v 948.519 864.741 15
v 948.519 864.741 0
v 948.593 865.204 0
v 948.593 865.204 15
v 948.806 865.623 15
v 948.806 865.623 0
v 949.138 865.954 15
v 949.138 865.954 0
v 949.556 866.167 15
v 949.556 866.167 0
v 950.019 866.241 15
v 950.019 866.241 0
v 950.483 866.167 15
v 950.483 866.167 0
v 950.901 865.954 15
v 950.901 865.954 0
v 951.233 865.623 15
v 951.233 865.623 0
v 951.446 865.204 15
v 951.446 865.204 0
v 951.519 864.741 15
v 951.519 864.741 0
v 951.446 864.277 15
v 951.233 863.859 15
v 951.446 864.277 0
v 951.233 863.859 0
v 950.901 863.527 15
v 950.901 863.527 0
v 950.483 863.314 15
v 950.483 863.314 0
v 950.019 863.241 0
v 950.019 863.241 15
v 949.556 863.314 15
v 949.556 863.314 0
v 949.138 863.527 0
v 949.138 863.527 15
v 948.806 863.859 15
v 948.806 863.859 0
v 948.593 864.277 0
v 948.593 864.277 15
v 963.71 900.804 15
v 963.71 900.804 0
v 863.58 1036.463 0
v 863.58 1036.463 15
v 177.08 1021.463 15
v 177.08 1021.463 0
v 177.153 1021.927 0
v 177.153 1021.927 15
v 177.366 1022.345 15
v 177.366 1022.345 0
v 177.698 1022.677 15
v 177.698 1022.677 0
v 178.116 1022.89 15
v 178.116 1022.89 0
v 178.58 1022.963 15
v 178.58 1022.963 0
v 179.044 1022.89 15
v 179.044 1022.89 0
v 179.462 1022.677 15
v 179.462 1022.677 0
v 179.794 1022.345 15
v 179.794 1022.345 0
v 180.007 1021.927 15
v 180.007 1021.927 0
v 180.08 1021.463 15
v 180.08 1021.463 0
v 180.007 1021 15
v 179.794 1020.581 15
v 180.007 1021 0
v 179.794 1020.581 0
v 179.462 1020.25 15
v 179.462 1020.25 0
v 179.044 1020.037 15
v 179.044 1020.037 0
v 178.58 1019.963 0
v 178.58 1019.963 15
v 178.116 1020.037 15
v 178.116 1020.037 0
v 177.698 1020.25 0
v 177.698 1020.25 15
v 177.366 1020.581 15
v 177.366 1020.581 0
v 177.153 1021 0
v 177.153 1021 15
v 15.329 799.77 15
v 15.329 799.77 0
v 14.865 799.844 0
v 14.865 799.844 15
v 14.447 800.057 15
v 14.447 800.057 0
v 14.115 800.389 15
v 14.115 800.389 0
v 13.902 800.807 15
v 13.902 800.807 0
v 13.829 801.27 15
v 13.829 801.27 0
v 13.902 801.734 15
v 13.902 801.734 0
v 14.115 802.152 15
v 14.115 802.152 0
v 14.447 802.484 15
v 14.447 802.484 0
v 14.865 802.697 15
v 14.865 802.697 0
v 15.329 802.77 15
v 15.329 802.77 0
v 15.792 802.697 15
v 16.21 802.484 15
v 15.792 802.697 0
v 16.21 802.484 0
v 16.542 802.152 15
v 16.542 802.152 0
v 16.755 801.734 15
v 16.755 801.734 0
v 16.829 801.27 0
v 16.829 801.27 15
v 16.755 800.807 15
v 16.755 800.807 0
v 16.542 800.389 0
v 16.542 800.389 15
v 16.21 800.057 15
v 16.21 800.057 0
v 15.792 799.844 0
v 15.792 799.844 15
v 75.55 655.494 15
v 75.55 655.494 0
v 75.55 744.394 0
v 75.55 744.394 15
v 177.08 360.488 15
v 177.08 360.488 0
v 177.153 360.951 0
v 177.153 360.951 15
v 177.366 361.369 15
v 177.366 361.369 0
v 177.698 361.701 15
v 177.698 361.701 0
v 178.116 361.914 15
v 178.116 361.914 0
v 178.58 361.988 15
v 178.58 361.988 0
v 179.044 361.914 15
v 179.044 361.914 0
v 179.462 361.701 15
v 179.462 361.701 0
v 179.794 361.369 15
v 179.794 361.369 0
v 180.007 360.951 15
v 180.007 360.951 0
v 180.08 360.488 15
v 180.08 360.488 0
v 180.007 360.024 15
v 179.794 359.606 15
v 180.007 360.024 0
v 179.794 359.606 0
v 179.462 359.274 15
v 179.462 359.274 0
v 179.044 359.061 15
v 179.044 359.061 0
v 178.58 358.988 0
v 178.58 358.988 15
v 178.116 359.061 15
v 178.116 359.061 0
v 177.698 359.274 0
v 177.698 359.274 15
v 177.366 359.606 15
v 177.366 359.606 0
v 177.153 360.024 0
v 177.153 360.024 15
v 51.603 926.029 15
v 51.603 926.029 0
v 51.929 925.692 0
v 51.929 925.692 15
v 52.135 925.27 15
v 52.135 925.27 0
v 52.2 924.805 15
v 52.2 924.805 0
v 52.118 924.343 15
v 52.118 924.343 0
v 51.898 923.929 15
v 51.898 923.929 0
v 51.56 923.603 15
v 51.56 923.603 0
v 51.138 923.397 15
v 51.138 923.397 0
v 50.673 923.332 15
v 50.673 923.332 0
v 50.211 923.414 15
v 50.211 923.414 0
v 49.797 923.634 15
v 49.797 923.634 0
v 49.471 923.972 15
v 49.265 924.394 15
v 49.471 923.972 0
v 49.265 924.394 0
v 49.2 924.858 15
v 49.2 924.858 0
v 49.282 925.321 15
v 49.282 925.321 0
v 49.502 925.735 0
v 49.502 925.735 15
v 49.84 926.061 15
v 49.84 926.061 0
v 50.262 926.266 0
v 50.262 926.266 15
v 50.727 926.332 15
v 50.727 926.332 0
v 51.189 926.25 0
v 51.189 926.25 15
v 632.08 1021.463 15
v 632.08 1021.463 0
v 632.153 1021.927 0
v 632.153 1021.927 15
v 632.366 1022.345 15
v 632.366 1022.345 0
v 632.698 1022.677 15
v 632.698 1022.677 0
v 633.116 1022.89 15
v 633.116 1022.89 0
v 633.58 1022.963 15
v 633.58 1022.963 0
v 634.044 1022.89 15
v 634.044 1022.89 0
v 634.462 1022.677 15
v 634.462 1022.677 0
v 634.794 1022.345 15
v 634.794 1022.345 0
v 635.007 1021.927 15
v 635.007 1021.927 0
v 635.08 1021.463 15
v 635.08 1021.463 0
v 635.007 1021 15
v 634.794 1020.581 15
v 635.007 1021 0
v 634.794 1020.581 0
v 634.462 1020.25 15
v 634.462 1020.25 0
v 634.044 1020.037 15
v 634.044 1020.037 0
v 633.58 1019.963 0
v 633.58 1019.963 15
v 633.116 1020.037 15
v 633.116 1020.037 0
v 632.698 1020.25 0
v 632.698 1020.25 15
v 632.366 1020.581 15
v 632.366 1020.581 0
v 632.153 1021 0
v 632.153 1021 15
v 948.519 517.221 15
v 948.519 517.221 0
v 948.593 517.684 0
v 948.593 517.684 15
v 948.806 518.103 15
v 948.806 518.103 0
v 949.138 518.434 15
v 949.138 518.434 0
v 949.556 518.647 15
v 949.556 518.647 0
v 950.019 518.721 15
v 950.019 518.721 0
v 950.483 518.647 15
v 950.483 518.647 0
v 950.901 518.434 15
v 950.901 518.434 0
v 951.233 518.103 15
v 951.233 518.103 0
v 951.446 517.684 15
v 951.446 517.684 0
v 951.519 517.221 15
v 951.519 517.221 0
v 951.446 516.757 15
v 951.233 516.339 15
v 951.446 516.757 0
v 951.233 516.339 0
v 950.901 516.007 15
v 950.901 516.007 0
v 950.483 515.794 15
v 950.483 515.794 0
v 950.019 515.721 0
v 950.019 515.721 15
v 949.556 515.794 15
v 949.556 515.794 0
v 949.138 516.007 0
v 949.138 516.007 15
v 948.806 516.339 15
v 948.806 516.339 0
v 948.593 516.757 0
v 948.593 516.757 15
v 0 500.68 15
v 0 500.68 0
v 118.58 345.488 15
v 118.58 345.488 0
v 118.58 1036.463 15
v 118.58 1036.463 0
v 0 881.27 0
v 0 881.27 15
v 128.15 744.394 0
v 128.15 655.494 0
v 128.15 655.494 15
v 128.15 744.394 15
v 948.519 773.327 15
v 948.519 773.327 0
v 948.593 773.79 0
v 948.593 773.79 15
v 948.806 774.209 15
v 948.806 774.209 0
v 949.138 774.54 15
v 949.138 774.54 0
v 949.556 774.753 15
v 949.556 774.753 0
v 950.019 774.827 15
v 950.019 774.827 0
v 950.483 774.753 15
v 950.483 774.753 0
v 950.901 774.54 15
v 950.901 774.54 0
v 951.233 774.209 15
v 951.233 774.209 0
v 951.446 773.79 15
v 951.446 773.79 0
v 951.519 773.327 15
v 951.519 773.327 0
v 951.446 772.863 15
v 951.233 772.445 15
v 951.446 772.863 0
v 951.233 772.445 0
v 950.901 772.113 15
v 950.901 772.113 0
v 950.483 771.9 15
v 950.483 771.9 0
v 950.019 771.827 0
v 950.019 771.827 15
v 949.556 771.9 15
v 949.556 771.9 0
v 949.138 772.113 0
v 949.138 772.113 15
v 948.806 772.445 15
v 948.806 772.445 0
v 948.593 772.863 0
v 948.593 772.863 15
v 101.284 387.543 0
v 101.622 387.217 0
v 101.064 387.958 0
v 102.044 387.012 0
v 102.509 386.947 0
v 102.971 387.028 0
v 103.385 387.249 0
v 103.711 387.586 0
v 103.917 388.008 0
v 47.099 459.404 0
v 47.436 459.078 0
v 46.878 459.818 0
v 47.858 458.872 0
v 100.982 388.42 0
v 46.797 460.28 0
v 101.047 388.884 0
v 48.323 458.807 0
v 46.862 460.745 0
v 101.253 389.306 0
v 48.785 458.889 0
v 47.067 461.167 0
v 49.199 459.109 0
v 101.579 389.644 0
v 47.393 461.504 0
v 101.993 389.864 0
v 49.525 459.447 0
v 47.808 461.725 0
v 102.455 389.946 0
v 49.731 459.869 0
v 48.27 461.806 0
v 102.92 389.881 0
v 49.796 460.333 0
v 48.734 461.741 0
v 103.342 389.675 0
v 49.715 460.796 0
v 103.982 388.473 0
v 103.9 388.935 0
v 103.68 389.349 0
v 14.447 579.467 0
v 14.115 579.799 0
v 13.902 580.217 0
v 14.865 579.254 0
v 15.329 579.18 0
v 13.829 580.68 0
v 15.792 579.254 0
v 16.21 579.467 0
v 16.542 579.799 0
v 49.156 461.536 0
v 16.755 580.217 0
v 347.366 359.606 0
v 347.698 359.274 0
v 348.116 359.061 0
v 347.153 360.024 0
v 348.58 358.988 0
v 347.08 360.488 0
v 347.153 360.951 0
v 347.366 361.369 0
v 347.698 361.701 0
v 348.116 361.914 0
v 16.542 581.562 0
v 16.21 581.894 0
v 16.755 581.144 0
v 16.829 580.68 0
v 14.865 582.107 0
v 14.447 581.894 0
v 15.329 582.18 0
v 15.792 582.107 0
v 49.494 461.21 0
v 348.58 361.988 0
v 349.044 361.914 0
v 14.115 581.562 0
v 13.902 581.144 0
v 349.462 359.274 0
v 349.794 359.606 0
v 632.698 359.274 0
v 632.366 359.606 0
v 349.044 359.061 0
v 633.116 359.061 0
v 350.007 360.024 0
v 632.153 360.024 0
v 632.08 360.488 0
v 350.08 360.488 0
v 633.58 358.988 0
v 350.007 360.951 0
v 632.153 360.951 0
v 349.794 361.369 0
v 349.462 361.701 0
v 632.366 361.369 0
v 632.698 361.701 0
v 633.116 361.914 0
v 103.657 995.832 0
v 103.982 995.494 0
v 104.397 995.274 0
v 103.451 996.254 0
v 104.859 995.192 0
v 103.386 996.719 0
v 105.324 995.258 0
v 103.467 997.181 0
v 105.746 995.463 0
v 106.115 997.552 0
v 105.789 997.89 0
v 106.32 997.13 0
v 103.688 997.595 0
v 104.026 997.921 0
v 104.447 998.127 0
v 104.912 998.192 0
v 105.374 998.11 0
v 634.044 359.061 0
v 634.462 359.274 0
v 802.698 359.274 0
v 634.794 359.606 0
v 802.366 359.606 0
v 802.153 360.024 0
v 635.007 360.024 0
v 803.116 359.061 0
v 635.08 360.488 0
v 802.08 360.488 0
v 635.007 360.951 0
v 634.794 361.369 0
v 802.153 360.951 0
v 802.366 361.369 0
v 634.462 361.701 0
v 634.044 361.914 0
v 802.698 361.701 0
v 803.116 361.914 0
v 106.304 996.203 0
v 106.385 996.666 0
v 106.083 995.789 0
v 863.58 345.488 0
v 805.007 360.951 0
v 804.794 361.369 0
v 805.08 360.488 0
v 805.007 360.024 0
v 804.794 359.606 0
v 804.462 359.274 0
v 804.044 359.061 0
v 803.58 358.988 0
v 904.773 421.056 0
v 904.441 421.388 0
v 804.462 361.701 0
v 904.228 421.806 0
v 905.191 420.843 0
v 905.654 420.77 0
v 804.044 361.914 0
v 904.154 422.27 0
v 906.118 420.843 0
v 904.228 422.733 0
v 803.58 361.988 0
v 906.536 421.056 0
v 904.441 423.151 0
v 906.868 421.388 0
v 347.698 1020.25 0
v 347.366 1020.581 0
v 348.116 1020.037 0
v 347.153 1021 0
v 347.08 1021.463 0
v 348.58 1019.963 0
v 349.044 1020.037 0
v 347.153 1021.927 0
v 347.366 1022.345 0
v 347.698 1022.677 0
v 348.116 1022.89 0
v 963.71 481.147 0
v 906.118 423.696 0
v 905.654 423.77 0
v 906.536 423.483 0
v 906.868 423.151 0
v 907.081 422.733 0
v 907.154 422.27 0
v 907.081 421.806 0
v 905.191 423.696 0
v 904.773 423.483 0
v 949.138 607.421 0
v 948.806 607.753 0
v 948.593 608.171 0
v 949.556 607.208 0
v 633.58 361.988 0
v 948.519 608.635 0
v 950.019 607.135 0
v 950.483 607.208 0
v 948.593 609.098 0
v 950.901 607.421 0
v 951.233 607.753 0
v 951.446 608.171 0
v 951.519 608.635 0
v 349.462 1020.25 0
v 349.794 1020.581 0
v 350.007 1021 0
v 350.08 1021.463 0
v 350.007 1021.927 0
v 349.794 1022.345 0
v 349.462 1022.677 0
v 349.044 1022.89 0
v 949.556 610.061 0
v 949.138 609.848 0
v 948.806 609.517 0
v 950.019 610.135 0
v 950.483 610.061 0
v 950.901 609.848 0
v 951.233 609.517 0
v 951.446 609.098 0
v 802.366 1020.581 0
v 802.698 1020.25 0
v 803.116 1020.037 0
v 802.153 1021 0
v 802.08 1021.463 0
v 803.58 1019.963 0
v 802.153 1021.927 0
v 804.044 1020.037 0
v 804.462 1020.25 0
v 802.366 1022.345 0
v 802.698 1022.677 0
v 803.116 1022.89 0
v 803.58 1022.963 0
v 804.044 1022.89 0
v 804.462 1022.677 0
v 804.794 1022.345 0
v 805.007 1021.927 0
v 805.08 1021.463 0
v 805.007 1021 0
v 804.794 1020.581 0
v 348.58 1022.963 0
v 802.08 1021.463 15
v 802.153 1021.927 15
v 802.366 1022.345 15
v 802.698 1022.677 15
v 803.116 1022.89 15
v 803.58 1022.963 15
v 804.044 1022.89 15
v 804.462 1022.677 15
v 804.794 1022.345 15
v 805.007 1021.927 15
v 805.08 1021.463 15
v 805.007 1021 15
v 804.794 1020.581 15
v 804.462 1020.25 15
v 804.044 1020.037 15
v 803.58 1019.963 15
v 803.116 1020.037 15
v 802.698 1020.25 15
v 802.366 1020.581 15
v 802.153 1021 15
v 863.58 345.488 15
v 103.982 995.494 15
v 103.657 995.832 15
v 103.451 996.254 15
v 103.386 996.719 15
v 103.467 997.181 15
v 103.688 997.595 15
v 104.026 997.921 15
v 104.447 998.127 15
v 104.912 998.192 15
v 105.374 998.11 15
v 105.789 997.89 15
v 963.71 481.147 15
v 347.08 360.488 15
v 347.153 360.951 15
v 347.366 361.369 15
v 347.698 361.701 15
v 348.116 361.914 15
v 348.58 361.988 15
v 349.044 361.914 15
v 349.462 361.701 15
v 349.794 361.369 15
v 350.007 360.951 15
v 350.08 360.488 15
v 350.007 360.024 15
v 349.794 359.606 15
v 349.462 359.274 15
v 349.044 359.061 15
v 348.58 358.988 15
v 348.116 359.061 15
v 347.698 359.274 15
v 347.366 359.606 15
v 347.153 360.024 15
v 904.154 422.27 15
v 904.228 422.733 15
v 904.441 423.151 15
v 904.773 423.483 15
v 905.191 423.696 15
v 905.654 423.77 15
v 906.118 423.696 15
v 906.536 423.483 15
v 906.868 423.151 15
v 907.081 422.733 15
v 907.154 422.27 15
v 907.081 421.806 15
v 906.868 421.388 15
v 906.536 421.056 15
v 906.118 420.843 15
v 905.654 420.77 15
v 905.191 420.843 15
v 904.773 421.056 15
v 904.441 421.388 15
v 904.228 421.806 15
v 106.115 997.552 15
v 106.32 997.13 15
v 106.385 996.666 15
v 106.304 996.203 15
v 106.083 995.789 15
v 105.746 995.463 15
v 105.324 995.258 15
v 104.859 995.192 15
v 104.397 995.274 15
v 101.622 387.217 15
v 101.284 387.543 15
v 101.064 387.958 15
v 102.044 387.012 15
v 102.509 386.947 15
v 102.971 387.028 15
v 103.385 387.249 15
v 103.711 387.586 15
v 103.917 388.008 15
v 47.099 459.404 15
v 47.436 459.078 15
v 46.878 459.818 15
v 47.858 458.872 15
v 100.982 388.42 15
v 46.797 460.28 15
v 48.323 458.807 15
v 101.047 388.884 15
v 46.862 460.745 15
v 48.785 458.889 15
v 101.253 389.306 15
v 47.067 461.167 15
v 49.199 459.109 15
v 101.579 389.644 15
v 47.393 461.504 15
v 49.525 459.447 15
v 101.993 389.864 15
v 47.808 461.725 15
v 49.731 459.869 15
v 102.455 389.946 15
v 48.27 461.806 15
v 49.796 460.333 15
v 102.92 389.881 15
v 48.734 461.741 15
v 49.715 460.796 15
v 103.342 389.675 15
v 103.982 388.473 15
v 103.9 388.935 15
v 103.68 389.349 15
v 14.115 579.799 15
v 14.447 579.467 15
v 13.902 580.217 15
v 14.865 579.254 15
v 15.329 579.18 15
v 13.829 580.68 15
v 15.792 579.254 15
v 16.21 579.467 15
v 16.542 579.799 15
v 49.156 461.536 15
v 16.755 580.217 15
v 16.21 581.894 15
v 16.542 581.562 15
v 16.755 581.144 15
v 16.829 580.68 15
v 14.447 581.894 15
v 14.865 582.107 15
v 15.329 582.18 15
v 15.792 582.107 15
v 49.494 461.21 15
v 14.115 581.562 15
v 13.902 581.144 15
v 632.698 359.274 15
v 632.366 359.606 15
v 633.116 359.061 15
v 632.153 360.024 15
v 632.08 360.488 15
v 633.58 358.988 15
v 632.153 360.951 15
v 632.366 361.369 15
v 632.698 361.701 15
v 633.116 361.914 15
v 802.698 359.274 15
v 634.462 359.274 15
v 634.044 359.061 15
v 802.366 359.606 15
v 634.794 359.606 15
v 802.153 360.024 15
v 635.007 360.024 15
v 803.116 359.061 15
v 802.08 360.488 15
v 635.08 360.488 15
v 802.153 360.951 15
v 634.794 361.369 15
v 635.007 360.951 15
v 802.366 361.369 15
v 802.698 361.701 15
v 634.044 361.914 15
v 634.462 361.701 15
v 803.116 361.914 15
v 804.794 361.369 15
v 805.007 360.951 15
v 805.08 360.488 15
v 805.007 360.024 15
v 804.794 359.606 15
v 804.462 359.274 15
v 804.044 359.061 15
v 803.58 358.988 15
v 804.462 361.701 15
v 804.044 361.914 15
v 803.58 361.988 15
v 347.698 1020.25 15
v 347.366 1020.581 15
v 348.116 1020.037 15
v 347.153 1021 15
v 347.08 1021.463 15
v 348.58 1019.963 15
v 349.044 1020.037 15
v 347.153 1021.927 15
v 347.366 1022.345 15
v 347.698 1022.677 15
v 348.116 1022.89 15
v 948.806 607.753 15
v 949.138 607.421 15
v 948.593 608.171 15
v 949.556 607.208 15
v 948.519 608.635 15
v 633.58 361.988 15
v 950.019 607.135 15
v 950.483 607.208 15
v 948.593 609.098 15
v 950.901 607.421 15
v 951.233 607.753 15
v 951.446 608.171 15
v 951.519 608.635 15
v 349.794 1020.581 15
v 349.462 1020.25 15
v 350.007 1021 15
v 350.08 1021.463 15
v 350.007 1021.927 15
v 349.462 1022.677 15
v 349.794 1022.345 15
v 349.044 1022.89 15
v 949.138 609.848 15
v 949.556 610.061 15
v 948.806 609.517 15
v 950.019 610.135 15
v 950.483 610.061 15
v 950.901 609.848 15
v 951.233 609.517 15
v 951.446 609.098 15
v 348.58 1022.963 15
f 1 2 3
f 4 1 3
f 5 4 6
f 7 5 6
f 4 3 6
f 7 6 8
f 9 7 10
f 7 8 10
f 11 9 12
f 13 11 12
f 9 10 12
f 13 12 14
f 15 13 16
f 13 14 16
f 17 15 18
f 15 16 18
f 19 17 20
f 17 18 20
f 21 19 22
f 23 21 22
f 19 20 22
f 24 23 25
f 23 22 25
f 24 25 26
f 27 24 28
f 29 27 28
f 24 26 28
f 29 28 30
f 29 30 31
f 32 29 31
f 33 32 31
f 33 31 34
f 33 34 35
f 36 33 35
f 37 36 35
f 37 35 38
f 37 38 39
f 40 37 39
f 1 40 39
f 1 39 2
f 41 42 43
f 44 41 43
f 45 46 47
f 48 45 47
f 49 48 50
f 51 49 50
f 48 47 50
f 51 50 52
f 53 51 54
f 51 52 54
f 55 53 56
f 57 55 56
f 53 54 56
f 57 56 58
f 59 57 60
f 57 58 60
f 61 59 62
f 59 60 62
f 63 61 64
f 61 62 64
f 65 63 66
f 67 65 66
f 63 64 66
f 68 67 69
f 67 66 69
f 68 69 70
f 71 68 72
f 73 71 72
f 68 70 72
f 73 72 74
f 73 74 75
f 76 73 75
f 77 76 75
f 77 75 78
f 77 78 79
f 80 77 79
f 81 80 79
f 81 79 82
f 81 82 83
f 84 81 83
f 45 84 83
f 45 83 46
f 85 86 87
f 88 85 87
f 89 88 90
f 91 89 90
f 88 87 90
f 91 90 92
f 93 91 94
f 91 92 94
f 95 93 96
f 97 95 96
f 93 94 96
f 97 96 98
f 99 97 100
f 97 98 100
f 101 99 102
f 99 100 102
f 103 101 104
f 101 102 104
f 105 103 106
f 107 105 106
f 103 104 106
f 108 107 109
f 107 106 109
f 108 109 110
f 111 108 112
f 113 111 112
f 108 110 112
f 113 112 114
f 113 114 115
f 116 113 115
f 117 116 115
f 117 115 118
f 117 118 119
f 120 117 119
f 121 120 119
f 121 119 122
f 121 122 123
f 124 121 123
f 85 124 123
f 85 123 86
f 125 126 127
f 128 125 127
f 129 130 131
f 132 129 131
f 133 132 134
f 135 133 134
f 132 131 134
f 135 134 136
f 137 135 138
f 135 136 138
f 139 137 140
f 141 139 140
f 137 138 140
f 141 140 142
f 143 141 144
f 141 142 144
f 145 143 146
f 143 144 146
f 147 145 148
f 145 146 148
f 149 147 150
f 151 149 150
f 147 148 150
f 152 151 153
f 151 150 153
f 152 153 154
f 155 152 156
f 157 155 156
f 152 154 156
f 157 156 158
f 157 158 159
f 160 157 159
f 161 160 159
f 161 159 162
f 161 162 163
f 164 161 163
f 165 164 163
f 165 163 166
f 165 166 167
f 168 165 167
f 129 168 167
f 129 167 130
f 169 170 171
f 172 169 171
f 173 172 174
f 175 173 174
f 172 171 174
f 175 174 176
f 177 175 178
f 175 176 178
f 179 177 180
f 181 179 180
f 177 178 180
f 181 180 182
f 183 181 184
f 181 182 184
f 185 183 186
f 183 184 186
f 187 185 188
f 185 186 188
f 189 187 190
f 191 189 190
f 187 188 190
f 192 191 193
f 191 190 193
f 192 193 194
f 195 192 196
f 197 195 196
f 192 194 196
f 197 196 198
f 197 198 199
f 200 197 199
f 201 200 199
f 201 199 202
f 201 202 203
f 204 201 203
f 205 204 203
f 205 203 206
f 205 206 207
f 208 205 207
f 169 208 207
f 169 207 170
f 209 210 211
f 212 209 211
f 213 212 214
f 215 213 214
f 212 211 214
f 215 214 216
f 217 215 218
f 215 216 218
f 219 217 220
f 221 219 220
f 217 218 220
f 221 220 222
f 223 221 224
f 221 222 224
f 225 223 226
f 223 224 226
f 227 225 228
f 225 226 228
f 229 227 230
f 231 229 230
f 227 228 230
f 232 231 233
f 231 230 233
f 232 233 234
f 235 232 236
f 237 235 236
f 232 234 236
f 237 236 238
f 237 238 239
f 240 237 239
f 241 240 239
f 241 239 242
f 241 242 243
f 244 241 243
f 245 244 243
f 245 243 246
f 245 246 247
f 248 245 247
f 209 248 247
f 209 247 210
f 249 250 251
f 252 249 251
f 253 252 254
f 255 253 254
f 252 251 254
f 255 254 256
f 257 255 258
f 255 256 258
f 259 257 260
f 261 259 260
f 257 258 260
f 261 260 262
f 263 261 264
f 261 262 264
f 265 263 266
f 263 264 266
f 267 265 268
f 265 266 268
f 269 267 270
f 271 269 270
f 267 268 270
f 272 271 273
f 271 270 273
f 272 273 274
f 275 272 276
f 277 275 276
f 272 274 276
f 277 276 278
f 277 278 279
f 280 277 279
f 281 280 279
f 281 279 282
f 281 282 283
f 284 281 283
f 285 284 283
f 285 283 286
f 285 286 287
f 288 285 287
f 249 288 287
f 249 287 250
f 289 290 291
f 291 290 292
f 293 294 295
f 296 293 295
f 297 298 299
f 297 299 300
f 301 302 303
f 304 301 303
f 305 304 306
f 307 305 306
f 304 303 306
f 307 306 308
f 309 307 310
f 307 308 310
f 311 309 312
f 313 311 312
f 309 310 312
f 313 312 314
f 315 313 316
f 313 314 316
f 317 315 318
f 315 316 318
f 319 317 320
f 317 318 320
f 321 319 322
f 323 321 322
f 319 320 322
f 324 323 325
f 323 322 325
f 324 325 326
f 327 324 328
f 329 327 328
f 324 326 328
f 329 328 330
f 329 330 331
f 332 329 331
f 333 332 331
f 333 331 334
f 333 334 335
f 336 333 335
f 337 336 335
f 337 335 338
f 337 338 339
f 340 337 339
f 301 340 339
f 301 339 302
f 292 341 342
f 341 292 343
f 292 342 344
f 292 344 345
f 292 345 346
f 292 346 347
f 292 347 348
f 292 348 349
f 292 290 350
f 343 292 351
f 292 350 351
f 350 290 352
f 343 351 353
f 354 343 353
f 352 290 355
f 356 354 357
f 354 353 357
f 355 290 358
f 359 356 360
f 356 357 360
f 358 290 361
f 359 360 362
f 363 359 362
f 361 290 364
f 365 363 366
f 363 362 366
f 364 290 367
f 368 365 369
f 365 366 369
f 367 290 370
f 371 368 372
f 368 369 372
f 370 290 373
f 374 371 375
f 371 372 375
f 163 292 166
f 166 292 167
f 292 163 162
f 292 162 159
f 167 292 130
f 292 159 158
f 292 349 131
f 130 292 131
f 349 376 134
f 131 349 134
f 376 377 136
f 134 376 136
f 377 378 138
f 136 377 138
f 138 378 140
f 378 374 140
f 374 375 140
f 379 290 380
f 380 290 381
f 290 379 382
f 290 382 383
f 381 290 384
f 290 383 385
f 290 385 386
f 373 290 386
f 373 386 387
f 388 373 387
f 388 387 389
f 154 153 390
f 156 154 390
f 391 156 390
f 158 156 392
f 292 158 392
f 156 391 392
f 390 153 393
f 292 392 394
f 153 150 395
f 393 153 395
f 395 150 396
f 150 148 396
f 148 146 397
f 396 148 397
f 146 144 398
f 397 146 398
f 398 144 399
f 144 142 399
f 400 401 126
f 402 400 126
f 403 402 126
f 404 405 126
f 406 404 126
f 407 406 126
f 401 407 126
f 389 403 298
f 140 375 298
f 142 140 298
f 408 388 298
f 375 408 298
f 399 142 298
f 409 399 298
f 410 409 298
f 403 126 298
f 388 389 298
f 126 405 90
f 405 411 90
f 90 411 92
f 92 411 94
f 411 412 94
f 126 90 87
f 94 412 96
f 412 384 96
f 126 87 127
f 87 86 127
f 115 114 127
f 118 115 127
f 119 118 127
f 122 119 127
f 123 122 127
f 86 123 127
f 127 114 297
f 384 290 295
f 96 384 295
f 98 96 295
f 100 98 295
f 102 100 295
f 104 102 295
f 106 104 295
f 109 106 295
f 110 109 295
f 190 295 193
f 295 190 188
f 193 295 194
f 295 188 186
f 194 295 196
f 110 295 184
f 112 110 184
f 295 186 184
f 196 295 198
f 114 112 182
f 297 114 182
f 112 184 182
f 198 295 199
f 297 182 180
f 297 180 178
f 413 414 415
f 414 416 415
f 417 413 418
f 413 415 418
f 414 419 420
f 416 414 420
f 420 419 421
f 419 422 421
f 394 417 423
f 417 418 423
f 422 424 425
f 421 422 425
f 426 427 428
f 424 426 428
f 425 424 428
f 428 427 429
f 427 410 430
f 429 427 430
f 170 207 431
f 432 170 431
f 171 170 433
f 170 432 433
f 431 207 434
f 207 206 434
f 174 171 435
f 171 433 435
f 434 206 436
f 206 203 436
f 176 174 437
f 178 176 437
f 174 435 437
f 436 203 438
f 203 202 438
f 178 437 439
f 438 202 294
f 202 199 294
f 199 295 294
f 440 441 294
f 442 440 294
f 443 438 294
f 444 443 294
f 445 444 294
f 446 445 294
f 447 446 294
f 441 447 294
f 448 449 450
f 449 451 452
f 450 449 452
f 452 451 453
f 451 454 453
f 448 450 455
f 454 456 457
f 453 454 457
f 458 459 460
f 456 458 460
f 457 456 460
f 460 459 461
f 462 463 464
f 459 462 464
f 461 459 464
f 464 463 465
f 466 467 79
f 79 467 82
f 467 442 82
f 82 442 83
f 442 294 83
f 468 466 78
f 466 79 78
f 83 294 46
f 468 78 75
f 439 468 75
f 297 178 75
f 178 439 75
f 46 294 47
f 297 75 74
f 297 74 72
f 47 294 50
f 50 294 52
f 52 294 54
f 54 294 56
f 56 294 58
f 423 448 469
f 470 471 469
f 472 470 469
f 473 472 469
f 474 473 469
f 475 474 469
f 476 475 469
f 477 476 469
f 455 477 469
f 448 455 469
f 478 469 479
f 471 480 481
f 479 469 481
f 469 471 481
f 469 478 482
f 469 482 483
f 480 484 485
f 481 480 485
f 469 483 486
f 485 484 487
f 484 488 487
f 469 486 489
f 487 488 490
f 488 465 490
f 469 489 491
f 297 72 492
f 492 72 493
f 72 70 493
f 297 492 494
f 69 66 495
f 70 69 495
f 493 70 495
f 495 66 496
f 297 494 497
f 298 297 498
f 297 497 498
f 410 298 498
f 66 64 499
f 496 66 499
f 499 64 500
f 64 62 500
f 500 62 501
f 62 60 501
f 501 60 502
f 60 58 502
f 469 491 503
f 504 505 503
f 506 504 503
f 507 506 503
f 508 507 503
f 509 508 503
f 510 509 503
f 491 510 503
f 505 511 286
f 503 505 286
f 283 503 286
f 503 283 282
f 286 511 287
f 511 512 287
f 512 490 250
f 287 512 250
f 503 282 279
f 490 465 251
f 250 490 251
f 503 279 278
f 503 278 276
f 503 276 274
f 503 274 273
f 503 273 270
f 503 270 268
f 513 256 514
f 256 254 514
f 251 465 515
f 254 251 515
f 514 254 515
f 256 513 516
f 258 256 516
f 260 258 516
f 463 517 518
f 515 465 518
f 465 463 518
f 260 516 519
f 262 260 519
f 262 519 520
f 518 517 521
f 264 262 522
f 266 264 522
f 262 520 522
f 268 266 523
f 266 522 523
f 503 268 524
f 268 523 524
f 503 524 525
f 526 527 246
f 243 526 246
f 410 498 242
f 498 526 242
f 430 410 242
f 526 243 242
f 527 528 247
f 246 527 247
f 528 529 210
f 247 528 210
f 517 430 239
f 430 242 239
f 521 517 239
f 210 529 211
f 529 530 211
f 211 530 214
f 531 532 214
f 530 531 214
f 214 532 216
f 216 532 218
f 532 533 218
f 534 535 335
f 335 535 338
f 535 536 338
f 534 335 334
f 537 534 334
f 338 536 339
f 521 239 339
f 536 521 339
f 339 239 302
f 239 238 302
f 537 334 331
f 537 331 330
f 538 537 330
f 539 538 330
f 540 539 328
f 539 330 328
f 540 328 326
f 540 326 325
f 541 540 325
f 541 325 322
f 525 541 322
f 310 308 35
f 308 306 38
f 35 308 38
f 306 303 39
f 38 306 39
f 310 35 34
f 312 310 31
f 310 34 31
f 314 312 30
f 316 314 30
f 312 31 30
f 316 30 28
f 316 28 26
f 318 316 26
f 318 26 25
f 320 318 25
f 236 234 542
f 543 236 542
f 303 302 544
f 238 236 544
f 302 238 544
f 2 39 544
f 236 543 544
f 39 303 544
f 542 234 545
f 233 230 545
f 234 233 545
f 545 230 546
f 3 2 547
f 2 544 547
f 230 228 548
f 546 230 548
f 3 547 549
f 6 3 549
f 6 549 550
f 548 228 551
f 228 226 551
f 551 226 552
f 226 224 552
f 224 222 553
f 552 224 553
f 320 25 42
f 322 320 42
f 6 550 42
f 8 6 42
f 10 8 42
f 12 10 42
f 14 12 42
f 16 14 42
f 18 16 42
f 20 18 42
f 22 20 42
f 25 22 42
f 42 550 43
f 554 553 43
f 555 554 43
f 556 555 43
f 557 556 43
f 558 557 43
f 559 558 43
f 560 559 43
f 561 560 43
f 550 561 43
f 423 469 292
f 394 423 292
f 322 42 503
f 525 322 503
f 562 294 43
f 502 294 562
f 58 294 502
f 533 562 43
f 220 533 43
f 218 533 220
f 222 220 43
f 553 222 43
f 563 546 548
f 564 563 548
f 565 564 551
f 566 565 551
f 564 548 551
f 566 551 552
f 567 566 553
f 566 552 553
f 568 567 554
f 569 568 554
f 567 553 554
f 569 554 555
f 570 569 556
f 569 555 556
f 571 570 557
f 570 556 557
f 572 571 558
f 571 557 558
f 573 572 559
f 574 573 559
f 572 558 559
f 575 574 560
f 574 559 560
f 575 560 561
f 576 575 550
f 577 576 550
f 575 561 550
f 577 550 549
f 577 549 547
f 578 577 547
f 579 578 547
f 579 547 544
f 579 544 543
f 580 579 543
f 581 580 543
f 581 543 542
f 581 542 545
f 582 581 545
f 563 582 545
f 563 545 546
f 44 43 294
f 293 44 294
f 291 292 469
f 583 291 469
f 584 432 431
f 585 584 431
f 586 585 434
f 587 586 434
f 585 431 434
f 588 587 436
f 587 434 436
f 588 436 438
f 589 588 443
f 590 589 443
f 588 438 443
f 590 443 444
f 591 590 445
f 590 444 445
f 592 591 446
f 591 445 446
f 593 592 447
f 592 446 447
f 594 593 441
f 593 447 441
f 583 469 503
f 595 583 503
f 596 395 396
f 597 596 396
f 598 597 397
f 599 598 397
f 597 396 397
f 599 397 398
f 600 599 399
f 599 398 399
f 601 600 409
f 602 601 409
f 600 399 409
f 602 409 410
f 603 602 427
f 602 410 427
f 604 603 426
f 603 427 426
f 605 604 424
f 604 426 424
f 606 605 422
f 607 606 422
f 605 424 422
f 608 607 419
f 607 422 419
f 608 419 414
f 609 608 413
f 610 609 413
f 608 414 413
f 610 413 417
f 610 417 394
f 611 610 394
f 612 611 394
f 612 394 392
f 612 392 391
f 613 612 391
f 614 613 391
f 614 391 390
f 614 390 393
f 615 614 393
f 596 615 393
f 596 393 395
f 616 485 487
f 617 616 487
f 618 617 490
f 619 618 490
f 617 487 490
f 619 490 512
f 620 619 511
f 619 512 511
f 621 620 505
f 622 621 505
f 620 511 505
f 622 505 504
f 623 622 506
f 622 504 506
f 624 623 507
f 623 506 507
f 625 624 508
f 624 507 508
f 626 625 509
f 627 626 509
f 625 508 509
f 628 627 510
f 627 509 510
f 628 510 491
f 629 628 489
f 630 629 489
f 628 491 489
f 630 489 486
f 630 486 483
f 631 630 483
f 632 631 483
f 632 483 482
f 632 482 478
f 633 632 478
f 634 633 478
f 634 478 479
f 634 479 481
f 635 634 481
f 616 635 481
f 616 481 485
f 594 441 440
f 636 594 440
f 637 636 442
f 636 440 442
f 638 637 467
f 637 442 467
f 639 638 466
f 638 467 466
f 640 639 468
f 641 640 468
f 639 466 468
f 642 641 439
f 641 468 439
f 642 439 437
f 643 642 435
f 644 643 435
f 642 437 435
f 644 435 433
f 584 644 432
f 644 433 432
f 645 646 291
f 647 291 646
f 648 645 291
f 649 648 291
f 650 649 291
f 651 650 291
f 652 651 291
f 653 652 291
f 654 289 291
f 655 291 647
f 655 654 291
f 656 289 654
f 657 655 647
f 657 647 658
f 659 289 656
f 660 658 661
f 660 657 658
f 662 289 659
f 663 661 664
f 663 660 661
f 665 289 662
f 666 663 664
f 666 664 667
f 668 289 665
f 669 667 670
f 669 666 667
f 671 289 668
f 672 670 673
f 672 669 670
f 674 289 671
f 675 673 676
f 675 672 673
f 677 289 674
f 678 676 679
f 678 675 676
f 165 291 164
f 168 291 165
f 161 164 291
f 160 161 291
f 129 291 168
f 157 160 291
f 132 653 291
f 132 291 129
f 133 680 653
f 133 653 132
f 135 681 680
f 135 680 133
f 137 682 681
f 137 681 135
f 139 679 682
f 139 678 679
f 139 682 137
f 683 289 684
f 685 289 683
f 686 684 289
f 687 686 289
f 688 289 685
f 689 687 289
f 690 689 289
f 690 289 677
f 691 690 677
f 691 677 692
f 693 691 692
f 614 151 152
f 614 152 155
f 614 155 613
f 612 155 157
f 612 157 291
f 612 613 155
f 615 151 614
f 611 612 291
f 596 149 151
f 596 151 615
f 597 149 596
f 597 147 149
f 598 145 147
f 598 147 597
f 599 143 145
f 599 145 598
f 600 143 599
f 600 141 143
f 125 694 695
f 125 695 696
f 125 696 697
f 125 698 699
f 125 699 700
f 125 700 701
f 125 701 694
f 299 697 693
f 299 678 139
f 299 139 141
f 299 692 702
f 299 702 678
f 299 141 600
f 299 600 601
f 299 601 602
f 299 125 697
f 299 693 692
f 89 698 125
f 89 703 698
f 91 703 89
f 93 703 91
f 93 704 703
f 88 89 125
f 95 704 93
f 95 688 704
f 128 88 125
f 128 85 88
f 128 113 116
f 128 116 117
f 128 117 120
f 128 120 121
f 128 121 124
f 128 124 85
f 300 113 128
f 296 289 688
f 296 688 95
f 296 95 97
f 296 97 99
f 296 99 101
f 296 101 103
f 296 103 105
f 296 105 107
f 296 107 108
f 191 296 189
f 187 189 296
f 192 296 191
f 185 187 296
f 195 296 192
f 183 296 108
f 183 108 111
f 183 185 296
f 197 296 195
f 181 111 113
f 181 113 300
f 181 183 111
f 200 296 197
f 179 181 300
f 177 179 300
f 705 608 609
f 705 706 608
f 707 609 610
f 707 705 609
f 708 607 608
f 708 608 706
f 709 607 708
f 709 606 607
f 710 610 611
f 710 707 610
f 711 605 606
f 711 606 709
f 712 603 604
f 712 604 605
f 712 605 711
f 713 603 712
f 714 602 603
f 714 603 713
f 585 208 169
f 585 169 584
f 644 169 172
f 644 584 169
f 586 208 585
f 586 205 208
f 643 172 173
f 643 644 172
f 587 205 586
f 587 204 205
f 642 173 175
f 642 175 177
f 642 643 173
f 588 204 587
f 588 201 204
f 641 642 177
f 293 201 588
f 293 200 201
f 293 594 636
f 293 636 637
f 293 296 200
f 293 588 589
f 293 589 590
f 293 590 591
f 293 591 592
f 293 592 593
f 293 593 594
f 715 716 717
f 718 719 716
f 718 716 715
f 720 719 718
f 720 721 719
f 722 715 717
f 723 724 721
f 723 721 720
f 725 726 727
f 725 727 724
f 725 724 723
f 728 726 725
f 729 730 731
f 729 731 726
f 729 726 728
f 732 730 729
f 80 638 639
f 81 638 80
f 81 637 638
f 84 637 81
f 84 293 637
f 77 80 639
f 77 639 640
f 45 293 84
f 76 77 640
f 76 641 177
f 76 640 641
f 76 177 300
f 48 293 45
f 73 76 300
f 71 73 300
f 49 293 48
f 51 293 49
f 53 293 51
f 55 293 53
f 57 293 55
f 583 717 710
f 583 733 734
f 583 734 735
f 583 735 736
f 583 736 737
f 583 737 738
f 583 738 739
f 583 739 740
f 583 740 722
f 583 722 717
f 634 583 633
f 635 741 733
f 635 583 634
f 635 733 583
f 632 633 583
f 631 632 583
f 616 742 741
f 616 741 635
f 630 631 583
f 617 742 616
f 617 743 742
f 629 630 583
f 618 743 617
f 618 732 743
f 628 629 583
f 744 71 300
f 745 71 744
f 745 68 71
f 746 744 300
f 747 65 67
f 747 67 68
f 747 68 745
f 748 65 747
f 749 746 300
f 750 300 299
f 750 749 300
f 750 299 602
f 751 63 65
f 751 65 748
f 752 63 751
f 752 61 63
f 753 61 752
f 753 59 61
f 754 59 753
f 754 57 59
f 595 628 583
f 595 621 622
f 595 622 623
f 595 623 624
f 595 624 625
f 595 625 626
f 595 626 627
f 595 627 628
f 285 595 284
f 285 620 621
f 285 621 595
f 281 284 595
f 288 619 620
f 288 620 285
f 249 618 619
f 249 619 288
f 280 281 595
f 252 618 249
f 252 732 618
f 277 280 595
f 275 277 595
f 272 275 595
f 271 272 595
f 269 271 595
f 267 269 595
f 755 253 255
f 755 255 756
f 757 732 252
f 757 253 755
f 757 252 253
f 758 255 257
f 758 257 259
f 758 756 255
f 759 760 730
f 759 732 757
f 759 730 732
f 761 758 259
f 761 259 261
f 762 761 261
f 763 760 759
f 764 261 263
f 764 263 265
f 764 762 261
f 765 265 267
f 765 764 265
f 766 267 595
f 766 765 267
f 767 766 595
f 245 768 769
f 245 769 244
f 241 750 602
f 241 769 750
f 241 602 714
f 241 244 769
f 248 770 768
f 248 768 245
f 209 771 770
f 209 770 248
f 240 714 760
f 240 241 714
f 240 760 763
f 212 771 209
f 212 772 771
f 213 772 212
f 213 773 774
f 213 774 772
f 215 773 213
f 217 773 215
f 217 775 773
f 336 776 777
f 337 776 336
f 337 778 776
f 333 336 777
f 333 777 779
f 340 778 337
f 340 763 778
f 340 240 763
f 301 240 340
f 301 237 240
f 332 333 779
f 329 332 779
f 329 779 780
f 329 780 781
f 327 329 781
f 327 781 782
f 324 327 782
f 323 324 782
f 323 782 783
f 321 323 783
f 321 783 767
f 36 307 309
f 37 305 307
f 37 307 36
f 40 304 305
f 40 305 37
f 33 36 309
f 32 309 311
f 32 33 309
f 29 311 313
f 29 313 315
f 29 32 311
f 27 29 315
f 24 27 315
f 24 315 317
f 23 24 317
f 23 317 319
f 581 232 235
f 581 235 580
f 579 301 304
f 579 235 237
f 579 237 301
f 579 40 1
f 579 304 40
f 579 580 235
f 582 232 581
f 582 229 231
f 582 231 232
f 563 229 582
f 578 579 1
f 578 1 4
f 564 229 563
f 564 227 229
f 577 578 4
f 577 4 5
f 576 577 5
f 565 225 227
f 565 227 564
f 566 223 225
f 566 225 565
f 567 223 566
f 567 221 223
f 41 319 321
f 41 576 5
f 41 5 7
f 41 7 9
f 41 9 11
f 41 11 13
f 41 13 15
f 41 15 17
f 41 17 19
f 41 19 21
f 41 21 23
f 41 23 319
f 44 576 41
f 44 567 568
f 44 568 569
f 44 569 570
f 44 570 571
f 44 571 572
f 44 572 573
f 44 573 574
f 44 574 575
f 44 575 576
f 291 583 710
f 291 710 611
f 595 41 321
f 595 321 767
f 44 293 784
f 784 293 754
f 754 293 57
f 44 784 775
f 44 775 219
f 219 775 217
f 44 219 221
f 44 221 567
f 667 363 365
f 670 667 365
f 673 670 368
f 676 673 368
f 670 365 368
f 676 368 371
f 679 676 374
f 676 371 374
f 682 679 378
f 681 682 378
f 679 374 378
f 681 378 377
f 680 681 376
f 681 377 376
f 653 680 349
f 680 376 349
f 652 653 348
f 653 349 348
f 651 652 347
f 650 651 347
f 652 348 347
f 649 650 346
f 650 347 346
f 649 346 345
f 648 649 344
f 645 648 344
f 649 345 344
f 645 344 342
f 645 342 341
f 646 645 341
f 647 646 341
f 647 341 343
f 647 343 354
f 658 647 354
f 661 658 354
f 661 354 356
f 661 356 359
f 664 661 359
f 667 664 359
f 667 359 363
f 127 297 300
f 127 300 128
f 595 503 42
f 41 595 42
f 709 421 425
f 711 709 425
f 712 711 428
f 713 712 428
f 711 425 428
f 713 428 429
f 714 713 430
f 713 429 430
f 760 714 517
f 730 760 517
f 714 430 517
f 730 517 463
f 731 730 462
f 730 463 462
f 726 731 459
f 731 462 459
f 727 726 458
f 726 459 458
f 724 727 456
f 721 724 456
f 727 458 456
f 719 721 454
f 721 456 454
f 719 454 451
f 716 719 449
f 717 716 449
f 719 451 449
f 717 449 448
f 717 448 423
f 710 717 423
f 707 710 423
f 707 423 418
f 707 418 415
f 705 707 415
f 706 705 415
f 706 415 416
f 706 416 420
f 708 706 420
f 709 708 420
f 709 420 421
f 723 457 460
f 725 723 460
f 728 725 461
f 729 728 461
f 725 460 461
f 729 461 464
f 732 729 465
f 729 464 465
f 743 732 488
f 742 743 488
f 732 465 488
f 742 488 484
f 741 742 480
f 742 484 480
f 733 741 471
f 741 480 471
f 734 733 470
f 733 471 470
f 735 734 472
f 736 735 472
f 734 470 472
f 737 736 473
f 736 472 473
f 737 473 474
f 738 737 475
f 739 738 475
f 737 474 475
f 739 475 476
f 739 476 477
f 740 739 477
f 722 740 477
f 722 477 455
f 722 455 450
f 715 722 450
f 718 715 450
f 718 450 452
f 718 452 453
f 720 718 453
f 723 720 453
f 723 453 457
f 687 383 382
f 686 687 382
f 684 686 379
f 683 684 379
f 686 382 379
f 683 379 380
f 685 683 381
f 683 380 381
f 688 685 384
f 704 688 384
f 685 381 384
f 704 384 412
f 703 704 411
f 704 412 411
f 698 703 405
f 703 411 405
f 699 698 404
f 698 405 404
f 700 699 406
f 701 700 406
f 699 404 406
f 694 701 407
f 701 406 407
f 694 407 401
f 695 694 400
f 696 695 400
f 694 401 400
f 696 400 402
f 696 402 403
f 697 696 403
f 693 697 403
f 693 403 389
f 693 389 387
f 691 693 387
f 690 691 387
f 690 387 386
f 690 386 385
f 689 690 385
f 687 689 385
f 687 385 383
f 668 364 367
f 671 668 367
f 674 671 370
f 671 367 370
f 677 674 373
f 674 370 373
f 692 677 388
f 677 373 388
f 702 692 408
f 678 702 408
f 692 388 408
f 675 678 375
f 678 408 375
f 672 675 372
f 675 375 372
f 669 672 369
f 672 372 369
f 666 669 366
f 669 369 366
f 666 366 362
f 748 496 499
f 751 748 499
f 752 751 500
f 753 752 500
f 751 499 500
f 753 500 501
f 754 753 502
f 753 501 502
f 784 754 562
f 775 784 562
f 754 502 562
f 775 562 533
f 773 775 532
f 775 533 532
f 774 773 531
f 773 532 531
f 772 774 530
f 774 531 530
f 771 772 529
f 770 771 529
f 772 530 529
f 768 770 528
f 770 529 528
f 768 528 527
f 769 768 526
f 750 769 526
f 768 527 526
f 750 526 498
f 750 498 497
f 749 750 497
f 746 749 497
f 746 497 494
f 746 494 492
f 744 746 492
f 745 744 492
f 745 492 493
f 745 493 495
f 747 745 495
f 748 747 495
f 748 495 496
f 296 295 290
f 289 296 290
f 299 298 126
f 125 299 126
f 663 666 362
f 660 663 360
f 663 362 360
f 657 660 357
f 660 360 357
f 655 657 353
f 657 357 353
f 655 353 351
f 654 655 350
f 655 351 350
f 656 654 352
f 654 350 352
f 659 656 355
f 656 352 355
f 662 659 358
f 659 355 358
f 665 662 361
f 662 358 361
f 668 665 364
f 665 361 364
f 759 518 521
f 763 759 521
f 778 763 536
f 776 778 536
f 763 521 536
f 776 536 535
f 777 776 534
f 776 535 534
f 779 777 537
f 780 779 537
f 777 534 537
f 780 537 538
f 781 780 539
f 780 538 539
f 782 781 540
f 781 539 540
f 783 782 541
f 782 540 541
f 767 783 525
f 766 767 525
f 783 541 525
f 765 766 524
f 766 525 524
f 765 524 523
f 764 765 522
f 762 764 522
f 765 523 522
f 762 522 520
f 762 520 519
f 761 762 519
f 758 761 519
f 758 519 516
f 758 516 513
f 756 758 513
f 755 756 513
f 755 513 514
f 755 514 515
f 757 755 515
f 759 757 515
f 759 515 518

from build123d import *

# Parameters (mm, degrees)
BOSS_EXTRUDE1_DEPTH     = 15
SKETCH9_R               = 1.5
CUT_EXTRUDE1_DEPTH      = 1
CUT_EXTRUDE1_DEPTH_BACK = 16
SKETCH10_W              = 52.6
SKETCH10_H              = 88.9
CUT_EXTRUDE2_DEPTH      = 16


with BuildPart() as part:
    # Sketch2 → Boss-Extrude1 (new body)
    with BuildSketch(Plane.XY):
        Polygon((0, 500.68043587), (118.58, 345.487717935), (863.58, 345.487717935), (963.71, 481.146537036), (963.71, 900.804334703), (863.58, 1036.463153804), (118.58, 1036.463153804), (0, 881.27043587), align=None)
    extrude(amount=BOSS_EXTRUDE1_DEPTH)

    # Sketch9 → Cut-Extrude1 (cut, two sides)
    with BuildSketch(Plane(origin=(0, 0, 0), x_dir=(-1, 0, 0), z_dir=(0, 0, -1))) as cut_extrude1_sk:
        with Locations((-803.58, 1021.463153804)):
            Circle(SKETCH9_R)
        with Locations((-633.58, 1021.463153804)):
            Circle(SKETCH9_R)
        with Locations((-348.58, 1021.463153804)):
            Circle(SKETCH9_R)
        with Locations((-178.58, 1021.463153804)):
            Circle(SKETCH9_R)
        with Locations((-178.58, 360.487717935)):
            Circle(SKETCH9_R)
        with Locations((-348.58, 360.487717935)):
            Circle(SKETCH9_R)
        with Locations((-633.58, 360.487717935)):
            Circle(SKETCH9_R)
        with Locations((-803.58, 360.487717935)):
            Circle(SKETCH9_R)
        with Locations((-905.654330921, 422.269736472)):
            Circle(SKETCH9_R)
        with Locations((-950.019491684, 517.22090145)):
            Circle(SKETCH9_R)
        with Locations((-950.019491684, 864.74090145)):
            Circle(SKETCH9_R)
        with Locations((-950.019491684, 773.32689058)):
            Circle(SKETCH9_R)
        with Locations((-950.019491684, 608.634912319)):
            Circle(SKETCH9_R)
        with BuildLine():
            ThreePointArc((-49.79686308, 923.634087088), (-49.502283169, 925.734854252), (-51.603050333, 926.029434163))
            ThreePointArc((-51.603050333, 926.029434163), (-51.897630244, 923.928666999), (-49.79686308, 923.634087088))
        make_face()
        with BuildLine():
            ThreePointArc((-103.982480668, 995.494499324), (-103.687900757, 997.595266487), (-105.78866792, 997.889846398))
            ThreePointArc((-105.78866792, 997.889846398), (-106.083247831, 995.789079234), (-103.982480668, 995.494499324))
        make_face()
        with BuildLine():
            ThreePointArc((-15.328698966, 802.77043587), (-16.828698966, 801.27043587), (-15.328698966, 799.77043587))
            ThreePointArc((-15.328698966, 799.77043587), (-13.828698966, 801.27043587), (-15.328698966, 802.77043587))
        make_face()
        with BuildLine():
            ThreePointArc((-15.328698966, 582.18043587), (-16.828698966, 580.68043587), (-15.328698966, 579.18043587))
            ThreePointArc((-15.328698966, 579.18043587), (-13.828698966, 580.68043587), (-15.328698966, 582.18043587))
        make_face()
        with BuildLine():
            ThreePointArc((-49.199469581, 459.109041803), (-47.098702418, 459.403621714), (-47.393282329, 461.504388877))
            ThreePointArc((-47.393282329, 461.504388877), (-49.494049492, 461.209808967), (-49.199469581, 459.109041803))
        make_face()
        with BuildLine():
            ThreePointArc((-103.385087169, 387.248629567), (-101.284320005, 387.543209478), (-101.578899916, 389.643976642))
            ThreePointArc((-101.578899916, 389.643976642), (-103.67966708, 389.349396731), (-103.385087169, 387.248629567))
        make_face()
    extrude(amount=CUT_EXTRUDE1_DEPTH, mode=Mode.SUBTRACT)
    extrude(cut_extrude1_sk.sketch, amount=-CUT_EXTRUDE1_DEPTH_BACK, mode=Mode.SUBTRACT)

    # Sketch10 → Cut-Extrude2 (cut, through all)
    with BuildSketch(Plane(origin=(0, 0, 0), x_dir=(-1, 0, 0), z_dir=(0, 0, -1))):
        with Locations((-101.850001448, 699.944225973)):
            Rectangle(SKETCH10_W, SKETCH10_H)
    extrude(amount=-CUT_EXTRUDE2_DEPTH, mode=Mode.SUBTRACT)


solid = part.part
